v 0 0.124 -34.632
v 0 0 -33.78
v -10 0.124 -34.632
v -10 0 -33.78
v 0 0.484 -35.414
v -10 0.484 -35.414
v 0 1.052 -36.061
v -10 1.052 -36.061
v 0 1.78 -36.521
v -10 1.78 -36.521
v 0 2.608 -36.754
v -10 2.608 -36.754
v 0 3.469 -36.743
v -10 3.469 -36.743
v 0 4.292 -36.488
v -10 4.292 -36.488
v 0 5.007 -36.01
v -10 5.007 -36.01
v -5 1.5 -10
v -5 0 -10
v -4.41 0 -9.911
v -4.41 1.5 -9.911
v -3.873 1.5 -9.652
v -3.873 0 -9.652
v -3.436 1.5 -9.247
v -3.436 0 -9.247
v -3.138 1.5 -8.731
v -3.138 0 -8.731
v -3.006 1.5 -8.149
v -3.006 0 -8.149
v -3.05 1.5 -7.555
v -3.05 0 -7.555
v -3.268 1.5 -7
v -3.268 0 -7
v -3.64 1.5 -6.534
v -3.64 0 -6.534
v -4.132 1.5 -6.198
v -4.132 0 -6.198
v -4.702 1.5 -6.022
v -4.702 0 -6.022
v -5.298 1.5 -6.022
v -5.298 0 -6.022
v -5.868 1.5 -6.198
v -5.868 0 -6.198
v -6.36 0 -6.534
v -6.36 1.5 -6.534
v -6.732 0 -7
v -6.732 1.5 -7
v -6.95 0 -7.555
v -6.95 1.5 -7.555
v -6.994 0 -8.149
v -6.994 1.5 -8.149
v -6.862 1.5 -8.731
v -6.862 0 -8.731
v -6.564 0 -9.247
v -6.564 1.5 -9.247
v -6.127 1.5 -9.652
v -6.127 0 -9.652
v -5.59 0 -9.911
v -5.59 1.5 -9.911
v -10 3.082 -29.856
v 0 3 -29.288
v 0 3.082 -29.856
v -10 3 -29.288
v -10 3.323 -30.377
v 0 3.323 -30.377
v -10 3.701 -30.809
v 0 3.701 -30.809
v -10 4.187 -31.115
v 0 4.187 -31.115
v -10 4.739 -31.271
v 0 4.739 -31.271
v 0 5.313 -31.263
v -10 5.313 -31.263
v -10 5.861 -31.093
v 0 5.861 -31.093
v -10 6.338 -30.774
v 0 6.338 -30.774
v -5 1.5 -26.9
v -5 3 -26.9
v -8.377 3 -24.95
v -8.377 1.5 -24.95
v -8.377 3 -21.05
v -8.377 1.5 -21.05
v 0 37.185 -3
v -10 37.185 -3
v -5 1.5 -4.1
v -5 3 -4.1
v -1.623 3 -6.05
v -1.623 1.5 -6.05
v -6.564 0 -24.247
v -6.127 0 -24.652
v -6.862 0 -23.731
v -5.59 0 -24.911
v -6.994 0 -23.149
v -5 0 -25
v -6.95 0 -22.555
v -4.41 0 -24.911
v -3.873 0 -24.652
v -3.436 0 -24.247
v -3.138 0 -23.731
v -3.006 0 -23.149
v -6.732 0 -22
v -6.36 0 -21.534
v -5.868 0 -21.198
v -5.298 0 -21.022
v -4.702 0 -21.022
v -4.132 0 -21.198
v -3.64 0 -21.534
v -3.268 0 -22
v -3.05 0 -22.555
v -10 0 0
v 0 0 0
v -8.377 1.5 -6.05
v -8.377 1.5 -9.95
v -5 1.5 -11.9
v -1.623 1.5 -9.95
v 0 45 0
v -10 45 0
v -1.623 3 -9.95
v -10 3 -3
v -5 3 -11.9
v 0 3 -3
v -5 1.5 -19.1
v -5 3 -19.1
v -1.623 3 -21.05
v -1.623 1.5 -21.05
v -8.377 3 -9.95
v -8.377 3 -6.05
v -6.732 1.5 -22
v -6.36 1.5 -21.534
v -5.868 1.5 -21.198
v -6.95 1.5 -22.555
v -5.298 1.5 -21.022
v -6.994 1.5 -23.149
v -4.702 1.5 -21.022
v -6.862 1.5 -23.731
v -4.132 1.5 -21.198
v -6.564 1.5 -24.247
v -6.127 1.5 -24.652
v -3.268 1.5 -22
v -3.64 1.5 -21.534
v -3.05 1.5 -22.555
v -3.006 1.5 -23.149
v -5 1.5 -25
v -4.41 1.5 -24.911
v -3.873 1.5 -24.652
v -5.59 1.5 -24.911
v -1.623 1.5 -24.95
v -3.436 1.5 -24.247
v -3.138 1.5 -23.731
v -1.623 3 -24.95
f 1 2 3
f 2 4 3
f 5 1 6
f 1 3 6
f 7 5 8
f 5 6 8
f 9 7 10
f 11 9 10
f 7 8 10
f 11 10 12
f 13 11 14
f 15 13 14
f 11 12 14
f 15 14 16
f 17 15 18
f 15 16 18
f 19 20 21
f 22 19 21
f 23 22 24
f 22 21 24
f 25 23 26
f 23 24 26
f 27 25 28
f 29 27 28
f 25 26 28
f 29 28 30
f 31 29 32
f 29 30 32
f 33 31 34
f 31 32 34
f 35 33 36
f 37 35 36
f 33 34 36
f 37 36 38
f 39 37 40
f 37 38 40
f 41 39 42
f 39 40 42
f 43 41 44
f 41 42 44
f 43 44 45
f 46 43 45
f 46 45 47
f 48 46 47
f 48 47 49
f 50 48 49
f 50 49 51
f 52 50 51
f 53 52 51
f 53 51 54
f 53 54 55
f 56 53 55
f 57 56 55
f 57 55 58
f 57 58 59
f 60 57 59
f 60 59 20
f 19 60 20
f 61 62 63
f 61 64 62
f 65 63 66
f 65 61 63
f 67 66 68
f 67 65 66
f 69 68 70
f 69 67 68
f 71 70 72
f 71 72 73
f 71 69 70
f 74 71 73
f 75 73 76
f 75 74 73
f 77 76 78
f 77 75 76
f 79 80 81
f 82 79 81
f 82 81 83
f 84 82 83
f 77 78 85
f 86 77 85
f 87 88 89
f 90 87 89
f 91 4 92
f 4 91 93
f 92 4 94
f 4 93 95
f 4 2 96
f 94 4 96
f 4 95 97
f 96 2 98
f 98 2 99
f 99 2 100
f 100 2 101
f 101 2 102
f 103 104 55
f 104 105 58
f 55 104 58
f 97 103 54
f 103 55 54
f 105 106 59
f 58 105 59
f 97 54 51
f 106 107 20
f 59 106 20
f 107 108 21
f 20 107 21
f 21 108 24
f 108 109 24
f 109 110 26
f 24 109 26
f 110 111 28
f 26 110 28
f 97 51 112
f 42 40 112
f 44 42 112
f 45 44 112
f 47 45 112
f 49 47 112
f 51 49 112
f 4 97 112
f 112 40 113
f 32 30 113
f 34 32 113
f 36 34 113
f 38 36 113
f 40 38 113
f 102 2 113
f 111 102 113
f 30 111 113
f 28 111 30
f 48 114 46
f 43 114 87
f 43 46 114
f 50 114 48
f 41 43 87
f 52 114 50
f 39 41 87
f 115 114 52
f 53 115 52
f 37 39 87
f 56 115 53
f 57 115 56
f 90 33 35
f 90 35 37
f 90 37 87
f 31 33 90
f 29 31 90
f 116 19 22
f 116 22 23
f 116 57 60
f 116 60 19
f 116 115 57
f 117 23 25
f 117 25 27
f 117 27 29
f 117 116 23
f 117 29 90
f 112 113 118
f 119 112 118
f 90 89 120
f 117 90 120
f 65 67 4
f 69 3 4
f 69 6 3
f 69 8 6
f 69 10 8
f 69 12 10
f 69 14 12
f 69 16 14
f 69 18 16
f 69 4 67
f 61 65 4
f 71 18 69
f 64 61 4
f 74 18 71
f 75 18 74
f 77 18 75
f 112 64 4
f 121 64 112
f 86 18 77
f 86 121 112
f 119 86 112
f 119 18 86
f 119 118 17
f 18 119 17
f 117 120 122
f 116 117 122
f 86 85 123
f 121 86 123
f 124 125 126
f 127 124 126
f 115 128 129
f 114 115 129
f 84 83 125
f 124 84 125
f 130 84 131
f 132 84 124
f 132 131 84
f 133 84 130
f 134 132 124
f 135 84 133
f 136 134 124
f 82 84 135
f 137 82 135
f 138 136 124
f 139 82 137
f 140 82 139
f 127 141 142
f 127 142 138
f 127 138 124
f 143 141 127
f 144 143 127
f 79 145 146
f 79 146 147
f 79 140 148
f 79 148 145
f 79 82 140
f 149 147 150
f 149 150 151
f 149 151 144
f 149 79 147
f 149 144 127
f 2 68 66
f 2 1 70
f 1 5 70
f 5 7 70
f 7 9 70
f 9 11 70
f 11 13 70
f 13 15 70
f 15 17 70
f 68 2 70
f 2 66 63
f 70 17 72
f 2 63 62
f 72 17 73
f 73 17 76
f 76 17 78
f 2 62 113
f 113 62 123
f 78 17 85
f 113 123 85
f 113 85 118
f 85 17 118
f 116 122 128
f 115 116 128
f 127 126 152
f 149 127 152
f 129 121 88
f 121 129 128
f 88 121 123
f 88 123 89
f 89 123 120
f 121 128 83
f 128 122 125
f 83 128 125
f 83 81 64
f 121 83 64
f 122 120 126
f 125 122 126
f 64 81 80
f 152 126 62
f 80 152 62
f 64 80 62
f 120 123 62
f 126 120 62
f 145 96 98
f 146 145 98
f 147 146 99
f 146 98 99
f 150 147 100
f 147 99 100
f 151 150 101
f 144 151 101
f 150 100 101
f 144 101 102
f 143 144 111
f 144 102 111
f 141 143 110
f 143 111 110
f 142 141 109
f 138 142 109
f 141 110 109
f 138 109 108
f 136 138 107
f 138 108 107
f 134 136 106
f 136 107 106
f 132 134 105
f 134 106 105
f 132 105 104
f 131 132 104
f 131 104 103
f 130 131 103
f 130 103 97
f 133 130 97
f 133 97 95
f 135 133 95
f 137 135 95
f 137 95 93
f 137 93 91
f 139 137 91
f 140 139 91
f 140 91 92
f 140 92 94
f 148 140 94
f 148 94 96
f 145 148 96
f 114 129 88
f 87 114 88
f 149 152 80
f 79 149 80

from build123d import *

# Parameters (mm, degrees)
BOSS_EXTRUDE1_DEPTH = 10
CUT_EXTRUDE1_DEPTH  = 62.373634991
SKETCH3_R           = 2
CUT_EXTRUDE2_DEPTH  = 3
CUT_EXTRUDE3_DEPTH  = 1.5
FILLET1_R           = 3
FILLET2_R           = 2


with BuildPart() as part:
    # Sketch1 → Boss-Extrude1 (new body)
    with BuildSketch(Plane(origin=(0, 0, 0), x_dir=(0, 0, -1), z_dir=(1, 0, 0))):
        Polygon((0, 0), (0, 45), (40.518181993, 0), align=None)
    extrude(amount=-BOSS_EXTRUDE1_DEPTH)

    # Sketch2 → Cut-Extrude1 (cut, through all)
    with BuildSketch(Plane(origin=(0, 0, 0), x_dir=(0, 0, -1), z_dir=(1, 0, 0))):
        Polygon((33.780071672, 3), (3, 37.184732806), (3, 3), align=None)
    extrude(amount=-CUT_EXTRUDE1_DEPTH, mode=Mode.SUBTRACT)

    # Sketch3 → Cut-Extrude2 (cut)
    with BuildSketch(Plane.XZ):
        with Locations(Location((-5, -8, 0), (0, 0, 270))):
            Circle(SKETCH3_R)
        with Locations(Location((-5, -23, 0), (0, 0, 270))):
            Circle(SKETCH3_R)
    extrude(amount=-CUT_EXTRUDE2_DEPTH, mode=Mode.SUBTRACT)

    # Sketch4 → Cut-Extrude3 (cut)
    with BuildSketch(Plane(origin=(0, 3, 0), x_dir=(1, 0, 0), z_dir=(0, 1, 0))):
        Polygon((-5, 19.1), (-1.622500925, 21.05), (-1.622500925, 24.95), (-5, 26.9), (-8.377499075, 24.95), (-8.377499075, 21.05), align=None)
        Polygon((-5, 11.9), (-8.377499075, 9.95), (-8.377499075, 6.05), (-5, 4.1), (-1.622500925, 6.05), (-1.622500925, 9.95), align=None)
    extrude(amount=-CUT_EXTRUDE3_DEPTH, mode=Mode.SUBTRACT)

    # Fillet1
    fillet1_edges = [part.edges().sort_by_distance(p)[0] for p in [
        (-5, 0, -40.518181993),
    ]]
    fillet(fillet1_edges, radius=FILLET1_R)

    # Fillet2
    fillet2_edges = [part.edges().sort_by_distance(p)[0] for p in [
        (-5, 3, -33.780071672),
    ]]
    fillet(fillet2_edges, radius=FILLET2_R)


solid = part.part
